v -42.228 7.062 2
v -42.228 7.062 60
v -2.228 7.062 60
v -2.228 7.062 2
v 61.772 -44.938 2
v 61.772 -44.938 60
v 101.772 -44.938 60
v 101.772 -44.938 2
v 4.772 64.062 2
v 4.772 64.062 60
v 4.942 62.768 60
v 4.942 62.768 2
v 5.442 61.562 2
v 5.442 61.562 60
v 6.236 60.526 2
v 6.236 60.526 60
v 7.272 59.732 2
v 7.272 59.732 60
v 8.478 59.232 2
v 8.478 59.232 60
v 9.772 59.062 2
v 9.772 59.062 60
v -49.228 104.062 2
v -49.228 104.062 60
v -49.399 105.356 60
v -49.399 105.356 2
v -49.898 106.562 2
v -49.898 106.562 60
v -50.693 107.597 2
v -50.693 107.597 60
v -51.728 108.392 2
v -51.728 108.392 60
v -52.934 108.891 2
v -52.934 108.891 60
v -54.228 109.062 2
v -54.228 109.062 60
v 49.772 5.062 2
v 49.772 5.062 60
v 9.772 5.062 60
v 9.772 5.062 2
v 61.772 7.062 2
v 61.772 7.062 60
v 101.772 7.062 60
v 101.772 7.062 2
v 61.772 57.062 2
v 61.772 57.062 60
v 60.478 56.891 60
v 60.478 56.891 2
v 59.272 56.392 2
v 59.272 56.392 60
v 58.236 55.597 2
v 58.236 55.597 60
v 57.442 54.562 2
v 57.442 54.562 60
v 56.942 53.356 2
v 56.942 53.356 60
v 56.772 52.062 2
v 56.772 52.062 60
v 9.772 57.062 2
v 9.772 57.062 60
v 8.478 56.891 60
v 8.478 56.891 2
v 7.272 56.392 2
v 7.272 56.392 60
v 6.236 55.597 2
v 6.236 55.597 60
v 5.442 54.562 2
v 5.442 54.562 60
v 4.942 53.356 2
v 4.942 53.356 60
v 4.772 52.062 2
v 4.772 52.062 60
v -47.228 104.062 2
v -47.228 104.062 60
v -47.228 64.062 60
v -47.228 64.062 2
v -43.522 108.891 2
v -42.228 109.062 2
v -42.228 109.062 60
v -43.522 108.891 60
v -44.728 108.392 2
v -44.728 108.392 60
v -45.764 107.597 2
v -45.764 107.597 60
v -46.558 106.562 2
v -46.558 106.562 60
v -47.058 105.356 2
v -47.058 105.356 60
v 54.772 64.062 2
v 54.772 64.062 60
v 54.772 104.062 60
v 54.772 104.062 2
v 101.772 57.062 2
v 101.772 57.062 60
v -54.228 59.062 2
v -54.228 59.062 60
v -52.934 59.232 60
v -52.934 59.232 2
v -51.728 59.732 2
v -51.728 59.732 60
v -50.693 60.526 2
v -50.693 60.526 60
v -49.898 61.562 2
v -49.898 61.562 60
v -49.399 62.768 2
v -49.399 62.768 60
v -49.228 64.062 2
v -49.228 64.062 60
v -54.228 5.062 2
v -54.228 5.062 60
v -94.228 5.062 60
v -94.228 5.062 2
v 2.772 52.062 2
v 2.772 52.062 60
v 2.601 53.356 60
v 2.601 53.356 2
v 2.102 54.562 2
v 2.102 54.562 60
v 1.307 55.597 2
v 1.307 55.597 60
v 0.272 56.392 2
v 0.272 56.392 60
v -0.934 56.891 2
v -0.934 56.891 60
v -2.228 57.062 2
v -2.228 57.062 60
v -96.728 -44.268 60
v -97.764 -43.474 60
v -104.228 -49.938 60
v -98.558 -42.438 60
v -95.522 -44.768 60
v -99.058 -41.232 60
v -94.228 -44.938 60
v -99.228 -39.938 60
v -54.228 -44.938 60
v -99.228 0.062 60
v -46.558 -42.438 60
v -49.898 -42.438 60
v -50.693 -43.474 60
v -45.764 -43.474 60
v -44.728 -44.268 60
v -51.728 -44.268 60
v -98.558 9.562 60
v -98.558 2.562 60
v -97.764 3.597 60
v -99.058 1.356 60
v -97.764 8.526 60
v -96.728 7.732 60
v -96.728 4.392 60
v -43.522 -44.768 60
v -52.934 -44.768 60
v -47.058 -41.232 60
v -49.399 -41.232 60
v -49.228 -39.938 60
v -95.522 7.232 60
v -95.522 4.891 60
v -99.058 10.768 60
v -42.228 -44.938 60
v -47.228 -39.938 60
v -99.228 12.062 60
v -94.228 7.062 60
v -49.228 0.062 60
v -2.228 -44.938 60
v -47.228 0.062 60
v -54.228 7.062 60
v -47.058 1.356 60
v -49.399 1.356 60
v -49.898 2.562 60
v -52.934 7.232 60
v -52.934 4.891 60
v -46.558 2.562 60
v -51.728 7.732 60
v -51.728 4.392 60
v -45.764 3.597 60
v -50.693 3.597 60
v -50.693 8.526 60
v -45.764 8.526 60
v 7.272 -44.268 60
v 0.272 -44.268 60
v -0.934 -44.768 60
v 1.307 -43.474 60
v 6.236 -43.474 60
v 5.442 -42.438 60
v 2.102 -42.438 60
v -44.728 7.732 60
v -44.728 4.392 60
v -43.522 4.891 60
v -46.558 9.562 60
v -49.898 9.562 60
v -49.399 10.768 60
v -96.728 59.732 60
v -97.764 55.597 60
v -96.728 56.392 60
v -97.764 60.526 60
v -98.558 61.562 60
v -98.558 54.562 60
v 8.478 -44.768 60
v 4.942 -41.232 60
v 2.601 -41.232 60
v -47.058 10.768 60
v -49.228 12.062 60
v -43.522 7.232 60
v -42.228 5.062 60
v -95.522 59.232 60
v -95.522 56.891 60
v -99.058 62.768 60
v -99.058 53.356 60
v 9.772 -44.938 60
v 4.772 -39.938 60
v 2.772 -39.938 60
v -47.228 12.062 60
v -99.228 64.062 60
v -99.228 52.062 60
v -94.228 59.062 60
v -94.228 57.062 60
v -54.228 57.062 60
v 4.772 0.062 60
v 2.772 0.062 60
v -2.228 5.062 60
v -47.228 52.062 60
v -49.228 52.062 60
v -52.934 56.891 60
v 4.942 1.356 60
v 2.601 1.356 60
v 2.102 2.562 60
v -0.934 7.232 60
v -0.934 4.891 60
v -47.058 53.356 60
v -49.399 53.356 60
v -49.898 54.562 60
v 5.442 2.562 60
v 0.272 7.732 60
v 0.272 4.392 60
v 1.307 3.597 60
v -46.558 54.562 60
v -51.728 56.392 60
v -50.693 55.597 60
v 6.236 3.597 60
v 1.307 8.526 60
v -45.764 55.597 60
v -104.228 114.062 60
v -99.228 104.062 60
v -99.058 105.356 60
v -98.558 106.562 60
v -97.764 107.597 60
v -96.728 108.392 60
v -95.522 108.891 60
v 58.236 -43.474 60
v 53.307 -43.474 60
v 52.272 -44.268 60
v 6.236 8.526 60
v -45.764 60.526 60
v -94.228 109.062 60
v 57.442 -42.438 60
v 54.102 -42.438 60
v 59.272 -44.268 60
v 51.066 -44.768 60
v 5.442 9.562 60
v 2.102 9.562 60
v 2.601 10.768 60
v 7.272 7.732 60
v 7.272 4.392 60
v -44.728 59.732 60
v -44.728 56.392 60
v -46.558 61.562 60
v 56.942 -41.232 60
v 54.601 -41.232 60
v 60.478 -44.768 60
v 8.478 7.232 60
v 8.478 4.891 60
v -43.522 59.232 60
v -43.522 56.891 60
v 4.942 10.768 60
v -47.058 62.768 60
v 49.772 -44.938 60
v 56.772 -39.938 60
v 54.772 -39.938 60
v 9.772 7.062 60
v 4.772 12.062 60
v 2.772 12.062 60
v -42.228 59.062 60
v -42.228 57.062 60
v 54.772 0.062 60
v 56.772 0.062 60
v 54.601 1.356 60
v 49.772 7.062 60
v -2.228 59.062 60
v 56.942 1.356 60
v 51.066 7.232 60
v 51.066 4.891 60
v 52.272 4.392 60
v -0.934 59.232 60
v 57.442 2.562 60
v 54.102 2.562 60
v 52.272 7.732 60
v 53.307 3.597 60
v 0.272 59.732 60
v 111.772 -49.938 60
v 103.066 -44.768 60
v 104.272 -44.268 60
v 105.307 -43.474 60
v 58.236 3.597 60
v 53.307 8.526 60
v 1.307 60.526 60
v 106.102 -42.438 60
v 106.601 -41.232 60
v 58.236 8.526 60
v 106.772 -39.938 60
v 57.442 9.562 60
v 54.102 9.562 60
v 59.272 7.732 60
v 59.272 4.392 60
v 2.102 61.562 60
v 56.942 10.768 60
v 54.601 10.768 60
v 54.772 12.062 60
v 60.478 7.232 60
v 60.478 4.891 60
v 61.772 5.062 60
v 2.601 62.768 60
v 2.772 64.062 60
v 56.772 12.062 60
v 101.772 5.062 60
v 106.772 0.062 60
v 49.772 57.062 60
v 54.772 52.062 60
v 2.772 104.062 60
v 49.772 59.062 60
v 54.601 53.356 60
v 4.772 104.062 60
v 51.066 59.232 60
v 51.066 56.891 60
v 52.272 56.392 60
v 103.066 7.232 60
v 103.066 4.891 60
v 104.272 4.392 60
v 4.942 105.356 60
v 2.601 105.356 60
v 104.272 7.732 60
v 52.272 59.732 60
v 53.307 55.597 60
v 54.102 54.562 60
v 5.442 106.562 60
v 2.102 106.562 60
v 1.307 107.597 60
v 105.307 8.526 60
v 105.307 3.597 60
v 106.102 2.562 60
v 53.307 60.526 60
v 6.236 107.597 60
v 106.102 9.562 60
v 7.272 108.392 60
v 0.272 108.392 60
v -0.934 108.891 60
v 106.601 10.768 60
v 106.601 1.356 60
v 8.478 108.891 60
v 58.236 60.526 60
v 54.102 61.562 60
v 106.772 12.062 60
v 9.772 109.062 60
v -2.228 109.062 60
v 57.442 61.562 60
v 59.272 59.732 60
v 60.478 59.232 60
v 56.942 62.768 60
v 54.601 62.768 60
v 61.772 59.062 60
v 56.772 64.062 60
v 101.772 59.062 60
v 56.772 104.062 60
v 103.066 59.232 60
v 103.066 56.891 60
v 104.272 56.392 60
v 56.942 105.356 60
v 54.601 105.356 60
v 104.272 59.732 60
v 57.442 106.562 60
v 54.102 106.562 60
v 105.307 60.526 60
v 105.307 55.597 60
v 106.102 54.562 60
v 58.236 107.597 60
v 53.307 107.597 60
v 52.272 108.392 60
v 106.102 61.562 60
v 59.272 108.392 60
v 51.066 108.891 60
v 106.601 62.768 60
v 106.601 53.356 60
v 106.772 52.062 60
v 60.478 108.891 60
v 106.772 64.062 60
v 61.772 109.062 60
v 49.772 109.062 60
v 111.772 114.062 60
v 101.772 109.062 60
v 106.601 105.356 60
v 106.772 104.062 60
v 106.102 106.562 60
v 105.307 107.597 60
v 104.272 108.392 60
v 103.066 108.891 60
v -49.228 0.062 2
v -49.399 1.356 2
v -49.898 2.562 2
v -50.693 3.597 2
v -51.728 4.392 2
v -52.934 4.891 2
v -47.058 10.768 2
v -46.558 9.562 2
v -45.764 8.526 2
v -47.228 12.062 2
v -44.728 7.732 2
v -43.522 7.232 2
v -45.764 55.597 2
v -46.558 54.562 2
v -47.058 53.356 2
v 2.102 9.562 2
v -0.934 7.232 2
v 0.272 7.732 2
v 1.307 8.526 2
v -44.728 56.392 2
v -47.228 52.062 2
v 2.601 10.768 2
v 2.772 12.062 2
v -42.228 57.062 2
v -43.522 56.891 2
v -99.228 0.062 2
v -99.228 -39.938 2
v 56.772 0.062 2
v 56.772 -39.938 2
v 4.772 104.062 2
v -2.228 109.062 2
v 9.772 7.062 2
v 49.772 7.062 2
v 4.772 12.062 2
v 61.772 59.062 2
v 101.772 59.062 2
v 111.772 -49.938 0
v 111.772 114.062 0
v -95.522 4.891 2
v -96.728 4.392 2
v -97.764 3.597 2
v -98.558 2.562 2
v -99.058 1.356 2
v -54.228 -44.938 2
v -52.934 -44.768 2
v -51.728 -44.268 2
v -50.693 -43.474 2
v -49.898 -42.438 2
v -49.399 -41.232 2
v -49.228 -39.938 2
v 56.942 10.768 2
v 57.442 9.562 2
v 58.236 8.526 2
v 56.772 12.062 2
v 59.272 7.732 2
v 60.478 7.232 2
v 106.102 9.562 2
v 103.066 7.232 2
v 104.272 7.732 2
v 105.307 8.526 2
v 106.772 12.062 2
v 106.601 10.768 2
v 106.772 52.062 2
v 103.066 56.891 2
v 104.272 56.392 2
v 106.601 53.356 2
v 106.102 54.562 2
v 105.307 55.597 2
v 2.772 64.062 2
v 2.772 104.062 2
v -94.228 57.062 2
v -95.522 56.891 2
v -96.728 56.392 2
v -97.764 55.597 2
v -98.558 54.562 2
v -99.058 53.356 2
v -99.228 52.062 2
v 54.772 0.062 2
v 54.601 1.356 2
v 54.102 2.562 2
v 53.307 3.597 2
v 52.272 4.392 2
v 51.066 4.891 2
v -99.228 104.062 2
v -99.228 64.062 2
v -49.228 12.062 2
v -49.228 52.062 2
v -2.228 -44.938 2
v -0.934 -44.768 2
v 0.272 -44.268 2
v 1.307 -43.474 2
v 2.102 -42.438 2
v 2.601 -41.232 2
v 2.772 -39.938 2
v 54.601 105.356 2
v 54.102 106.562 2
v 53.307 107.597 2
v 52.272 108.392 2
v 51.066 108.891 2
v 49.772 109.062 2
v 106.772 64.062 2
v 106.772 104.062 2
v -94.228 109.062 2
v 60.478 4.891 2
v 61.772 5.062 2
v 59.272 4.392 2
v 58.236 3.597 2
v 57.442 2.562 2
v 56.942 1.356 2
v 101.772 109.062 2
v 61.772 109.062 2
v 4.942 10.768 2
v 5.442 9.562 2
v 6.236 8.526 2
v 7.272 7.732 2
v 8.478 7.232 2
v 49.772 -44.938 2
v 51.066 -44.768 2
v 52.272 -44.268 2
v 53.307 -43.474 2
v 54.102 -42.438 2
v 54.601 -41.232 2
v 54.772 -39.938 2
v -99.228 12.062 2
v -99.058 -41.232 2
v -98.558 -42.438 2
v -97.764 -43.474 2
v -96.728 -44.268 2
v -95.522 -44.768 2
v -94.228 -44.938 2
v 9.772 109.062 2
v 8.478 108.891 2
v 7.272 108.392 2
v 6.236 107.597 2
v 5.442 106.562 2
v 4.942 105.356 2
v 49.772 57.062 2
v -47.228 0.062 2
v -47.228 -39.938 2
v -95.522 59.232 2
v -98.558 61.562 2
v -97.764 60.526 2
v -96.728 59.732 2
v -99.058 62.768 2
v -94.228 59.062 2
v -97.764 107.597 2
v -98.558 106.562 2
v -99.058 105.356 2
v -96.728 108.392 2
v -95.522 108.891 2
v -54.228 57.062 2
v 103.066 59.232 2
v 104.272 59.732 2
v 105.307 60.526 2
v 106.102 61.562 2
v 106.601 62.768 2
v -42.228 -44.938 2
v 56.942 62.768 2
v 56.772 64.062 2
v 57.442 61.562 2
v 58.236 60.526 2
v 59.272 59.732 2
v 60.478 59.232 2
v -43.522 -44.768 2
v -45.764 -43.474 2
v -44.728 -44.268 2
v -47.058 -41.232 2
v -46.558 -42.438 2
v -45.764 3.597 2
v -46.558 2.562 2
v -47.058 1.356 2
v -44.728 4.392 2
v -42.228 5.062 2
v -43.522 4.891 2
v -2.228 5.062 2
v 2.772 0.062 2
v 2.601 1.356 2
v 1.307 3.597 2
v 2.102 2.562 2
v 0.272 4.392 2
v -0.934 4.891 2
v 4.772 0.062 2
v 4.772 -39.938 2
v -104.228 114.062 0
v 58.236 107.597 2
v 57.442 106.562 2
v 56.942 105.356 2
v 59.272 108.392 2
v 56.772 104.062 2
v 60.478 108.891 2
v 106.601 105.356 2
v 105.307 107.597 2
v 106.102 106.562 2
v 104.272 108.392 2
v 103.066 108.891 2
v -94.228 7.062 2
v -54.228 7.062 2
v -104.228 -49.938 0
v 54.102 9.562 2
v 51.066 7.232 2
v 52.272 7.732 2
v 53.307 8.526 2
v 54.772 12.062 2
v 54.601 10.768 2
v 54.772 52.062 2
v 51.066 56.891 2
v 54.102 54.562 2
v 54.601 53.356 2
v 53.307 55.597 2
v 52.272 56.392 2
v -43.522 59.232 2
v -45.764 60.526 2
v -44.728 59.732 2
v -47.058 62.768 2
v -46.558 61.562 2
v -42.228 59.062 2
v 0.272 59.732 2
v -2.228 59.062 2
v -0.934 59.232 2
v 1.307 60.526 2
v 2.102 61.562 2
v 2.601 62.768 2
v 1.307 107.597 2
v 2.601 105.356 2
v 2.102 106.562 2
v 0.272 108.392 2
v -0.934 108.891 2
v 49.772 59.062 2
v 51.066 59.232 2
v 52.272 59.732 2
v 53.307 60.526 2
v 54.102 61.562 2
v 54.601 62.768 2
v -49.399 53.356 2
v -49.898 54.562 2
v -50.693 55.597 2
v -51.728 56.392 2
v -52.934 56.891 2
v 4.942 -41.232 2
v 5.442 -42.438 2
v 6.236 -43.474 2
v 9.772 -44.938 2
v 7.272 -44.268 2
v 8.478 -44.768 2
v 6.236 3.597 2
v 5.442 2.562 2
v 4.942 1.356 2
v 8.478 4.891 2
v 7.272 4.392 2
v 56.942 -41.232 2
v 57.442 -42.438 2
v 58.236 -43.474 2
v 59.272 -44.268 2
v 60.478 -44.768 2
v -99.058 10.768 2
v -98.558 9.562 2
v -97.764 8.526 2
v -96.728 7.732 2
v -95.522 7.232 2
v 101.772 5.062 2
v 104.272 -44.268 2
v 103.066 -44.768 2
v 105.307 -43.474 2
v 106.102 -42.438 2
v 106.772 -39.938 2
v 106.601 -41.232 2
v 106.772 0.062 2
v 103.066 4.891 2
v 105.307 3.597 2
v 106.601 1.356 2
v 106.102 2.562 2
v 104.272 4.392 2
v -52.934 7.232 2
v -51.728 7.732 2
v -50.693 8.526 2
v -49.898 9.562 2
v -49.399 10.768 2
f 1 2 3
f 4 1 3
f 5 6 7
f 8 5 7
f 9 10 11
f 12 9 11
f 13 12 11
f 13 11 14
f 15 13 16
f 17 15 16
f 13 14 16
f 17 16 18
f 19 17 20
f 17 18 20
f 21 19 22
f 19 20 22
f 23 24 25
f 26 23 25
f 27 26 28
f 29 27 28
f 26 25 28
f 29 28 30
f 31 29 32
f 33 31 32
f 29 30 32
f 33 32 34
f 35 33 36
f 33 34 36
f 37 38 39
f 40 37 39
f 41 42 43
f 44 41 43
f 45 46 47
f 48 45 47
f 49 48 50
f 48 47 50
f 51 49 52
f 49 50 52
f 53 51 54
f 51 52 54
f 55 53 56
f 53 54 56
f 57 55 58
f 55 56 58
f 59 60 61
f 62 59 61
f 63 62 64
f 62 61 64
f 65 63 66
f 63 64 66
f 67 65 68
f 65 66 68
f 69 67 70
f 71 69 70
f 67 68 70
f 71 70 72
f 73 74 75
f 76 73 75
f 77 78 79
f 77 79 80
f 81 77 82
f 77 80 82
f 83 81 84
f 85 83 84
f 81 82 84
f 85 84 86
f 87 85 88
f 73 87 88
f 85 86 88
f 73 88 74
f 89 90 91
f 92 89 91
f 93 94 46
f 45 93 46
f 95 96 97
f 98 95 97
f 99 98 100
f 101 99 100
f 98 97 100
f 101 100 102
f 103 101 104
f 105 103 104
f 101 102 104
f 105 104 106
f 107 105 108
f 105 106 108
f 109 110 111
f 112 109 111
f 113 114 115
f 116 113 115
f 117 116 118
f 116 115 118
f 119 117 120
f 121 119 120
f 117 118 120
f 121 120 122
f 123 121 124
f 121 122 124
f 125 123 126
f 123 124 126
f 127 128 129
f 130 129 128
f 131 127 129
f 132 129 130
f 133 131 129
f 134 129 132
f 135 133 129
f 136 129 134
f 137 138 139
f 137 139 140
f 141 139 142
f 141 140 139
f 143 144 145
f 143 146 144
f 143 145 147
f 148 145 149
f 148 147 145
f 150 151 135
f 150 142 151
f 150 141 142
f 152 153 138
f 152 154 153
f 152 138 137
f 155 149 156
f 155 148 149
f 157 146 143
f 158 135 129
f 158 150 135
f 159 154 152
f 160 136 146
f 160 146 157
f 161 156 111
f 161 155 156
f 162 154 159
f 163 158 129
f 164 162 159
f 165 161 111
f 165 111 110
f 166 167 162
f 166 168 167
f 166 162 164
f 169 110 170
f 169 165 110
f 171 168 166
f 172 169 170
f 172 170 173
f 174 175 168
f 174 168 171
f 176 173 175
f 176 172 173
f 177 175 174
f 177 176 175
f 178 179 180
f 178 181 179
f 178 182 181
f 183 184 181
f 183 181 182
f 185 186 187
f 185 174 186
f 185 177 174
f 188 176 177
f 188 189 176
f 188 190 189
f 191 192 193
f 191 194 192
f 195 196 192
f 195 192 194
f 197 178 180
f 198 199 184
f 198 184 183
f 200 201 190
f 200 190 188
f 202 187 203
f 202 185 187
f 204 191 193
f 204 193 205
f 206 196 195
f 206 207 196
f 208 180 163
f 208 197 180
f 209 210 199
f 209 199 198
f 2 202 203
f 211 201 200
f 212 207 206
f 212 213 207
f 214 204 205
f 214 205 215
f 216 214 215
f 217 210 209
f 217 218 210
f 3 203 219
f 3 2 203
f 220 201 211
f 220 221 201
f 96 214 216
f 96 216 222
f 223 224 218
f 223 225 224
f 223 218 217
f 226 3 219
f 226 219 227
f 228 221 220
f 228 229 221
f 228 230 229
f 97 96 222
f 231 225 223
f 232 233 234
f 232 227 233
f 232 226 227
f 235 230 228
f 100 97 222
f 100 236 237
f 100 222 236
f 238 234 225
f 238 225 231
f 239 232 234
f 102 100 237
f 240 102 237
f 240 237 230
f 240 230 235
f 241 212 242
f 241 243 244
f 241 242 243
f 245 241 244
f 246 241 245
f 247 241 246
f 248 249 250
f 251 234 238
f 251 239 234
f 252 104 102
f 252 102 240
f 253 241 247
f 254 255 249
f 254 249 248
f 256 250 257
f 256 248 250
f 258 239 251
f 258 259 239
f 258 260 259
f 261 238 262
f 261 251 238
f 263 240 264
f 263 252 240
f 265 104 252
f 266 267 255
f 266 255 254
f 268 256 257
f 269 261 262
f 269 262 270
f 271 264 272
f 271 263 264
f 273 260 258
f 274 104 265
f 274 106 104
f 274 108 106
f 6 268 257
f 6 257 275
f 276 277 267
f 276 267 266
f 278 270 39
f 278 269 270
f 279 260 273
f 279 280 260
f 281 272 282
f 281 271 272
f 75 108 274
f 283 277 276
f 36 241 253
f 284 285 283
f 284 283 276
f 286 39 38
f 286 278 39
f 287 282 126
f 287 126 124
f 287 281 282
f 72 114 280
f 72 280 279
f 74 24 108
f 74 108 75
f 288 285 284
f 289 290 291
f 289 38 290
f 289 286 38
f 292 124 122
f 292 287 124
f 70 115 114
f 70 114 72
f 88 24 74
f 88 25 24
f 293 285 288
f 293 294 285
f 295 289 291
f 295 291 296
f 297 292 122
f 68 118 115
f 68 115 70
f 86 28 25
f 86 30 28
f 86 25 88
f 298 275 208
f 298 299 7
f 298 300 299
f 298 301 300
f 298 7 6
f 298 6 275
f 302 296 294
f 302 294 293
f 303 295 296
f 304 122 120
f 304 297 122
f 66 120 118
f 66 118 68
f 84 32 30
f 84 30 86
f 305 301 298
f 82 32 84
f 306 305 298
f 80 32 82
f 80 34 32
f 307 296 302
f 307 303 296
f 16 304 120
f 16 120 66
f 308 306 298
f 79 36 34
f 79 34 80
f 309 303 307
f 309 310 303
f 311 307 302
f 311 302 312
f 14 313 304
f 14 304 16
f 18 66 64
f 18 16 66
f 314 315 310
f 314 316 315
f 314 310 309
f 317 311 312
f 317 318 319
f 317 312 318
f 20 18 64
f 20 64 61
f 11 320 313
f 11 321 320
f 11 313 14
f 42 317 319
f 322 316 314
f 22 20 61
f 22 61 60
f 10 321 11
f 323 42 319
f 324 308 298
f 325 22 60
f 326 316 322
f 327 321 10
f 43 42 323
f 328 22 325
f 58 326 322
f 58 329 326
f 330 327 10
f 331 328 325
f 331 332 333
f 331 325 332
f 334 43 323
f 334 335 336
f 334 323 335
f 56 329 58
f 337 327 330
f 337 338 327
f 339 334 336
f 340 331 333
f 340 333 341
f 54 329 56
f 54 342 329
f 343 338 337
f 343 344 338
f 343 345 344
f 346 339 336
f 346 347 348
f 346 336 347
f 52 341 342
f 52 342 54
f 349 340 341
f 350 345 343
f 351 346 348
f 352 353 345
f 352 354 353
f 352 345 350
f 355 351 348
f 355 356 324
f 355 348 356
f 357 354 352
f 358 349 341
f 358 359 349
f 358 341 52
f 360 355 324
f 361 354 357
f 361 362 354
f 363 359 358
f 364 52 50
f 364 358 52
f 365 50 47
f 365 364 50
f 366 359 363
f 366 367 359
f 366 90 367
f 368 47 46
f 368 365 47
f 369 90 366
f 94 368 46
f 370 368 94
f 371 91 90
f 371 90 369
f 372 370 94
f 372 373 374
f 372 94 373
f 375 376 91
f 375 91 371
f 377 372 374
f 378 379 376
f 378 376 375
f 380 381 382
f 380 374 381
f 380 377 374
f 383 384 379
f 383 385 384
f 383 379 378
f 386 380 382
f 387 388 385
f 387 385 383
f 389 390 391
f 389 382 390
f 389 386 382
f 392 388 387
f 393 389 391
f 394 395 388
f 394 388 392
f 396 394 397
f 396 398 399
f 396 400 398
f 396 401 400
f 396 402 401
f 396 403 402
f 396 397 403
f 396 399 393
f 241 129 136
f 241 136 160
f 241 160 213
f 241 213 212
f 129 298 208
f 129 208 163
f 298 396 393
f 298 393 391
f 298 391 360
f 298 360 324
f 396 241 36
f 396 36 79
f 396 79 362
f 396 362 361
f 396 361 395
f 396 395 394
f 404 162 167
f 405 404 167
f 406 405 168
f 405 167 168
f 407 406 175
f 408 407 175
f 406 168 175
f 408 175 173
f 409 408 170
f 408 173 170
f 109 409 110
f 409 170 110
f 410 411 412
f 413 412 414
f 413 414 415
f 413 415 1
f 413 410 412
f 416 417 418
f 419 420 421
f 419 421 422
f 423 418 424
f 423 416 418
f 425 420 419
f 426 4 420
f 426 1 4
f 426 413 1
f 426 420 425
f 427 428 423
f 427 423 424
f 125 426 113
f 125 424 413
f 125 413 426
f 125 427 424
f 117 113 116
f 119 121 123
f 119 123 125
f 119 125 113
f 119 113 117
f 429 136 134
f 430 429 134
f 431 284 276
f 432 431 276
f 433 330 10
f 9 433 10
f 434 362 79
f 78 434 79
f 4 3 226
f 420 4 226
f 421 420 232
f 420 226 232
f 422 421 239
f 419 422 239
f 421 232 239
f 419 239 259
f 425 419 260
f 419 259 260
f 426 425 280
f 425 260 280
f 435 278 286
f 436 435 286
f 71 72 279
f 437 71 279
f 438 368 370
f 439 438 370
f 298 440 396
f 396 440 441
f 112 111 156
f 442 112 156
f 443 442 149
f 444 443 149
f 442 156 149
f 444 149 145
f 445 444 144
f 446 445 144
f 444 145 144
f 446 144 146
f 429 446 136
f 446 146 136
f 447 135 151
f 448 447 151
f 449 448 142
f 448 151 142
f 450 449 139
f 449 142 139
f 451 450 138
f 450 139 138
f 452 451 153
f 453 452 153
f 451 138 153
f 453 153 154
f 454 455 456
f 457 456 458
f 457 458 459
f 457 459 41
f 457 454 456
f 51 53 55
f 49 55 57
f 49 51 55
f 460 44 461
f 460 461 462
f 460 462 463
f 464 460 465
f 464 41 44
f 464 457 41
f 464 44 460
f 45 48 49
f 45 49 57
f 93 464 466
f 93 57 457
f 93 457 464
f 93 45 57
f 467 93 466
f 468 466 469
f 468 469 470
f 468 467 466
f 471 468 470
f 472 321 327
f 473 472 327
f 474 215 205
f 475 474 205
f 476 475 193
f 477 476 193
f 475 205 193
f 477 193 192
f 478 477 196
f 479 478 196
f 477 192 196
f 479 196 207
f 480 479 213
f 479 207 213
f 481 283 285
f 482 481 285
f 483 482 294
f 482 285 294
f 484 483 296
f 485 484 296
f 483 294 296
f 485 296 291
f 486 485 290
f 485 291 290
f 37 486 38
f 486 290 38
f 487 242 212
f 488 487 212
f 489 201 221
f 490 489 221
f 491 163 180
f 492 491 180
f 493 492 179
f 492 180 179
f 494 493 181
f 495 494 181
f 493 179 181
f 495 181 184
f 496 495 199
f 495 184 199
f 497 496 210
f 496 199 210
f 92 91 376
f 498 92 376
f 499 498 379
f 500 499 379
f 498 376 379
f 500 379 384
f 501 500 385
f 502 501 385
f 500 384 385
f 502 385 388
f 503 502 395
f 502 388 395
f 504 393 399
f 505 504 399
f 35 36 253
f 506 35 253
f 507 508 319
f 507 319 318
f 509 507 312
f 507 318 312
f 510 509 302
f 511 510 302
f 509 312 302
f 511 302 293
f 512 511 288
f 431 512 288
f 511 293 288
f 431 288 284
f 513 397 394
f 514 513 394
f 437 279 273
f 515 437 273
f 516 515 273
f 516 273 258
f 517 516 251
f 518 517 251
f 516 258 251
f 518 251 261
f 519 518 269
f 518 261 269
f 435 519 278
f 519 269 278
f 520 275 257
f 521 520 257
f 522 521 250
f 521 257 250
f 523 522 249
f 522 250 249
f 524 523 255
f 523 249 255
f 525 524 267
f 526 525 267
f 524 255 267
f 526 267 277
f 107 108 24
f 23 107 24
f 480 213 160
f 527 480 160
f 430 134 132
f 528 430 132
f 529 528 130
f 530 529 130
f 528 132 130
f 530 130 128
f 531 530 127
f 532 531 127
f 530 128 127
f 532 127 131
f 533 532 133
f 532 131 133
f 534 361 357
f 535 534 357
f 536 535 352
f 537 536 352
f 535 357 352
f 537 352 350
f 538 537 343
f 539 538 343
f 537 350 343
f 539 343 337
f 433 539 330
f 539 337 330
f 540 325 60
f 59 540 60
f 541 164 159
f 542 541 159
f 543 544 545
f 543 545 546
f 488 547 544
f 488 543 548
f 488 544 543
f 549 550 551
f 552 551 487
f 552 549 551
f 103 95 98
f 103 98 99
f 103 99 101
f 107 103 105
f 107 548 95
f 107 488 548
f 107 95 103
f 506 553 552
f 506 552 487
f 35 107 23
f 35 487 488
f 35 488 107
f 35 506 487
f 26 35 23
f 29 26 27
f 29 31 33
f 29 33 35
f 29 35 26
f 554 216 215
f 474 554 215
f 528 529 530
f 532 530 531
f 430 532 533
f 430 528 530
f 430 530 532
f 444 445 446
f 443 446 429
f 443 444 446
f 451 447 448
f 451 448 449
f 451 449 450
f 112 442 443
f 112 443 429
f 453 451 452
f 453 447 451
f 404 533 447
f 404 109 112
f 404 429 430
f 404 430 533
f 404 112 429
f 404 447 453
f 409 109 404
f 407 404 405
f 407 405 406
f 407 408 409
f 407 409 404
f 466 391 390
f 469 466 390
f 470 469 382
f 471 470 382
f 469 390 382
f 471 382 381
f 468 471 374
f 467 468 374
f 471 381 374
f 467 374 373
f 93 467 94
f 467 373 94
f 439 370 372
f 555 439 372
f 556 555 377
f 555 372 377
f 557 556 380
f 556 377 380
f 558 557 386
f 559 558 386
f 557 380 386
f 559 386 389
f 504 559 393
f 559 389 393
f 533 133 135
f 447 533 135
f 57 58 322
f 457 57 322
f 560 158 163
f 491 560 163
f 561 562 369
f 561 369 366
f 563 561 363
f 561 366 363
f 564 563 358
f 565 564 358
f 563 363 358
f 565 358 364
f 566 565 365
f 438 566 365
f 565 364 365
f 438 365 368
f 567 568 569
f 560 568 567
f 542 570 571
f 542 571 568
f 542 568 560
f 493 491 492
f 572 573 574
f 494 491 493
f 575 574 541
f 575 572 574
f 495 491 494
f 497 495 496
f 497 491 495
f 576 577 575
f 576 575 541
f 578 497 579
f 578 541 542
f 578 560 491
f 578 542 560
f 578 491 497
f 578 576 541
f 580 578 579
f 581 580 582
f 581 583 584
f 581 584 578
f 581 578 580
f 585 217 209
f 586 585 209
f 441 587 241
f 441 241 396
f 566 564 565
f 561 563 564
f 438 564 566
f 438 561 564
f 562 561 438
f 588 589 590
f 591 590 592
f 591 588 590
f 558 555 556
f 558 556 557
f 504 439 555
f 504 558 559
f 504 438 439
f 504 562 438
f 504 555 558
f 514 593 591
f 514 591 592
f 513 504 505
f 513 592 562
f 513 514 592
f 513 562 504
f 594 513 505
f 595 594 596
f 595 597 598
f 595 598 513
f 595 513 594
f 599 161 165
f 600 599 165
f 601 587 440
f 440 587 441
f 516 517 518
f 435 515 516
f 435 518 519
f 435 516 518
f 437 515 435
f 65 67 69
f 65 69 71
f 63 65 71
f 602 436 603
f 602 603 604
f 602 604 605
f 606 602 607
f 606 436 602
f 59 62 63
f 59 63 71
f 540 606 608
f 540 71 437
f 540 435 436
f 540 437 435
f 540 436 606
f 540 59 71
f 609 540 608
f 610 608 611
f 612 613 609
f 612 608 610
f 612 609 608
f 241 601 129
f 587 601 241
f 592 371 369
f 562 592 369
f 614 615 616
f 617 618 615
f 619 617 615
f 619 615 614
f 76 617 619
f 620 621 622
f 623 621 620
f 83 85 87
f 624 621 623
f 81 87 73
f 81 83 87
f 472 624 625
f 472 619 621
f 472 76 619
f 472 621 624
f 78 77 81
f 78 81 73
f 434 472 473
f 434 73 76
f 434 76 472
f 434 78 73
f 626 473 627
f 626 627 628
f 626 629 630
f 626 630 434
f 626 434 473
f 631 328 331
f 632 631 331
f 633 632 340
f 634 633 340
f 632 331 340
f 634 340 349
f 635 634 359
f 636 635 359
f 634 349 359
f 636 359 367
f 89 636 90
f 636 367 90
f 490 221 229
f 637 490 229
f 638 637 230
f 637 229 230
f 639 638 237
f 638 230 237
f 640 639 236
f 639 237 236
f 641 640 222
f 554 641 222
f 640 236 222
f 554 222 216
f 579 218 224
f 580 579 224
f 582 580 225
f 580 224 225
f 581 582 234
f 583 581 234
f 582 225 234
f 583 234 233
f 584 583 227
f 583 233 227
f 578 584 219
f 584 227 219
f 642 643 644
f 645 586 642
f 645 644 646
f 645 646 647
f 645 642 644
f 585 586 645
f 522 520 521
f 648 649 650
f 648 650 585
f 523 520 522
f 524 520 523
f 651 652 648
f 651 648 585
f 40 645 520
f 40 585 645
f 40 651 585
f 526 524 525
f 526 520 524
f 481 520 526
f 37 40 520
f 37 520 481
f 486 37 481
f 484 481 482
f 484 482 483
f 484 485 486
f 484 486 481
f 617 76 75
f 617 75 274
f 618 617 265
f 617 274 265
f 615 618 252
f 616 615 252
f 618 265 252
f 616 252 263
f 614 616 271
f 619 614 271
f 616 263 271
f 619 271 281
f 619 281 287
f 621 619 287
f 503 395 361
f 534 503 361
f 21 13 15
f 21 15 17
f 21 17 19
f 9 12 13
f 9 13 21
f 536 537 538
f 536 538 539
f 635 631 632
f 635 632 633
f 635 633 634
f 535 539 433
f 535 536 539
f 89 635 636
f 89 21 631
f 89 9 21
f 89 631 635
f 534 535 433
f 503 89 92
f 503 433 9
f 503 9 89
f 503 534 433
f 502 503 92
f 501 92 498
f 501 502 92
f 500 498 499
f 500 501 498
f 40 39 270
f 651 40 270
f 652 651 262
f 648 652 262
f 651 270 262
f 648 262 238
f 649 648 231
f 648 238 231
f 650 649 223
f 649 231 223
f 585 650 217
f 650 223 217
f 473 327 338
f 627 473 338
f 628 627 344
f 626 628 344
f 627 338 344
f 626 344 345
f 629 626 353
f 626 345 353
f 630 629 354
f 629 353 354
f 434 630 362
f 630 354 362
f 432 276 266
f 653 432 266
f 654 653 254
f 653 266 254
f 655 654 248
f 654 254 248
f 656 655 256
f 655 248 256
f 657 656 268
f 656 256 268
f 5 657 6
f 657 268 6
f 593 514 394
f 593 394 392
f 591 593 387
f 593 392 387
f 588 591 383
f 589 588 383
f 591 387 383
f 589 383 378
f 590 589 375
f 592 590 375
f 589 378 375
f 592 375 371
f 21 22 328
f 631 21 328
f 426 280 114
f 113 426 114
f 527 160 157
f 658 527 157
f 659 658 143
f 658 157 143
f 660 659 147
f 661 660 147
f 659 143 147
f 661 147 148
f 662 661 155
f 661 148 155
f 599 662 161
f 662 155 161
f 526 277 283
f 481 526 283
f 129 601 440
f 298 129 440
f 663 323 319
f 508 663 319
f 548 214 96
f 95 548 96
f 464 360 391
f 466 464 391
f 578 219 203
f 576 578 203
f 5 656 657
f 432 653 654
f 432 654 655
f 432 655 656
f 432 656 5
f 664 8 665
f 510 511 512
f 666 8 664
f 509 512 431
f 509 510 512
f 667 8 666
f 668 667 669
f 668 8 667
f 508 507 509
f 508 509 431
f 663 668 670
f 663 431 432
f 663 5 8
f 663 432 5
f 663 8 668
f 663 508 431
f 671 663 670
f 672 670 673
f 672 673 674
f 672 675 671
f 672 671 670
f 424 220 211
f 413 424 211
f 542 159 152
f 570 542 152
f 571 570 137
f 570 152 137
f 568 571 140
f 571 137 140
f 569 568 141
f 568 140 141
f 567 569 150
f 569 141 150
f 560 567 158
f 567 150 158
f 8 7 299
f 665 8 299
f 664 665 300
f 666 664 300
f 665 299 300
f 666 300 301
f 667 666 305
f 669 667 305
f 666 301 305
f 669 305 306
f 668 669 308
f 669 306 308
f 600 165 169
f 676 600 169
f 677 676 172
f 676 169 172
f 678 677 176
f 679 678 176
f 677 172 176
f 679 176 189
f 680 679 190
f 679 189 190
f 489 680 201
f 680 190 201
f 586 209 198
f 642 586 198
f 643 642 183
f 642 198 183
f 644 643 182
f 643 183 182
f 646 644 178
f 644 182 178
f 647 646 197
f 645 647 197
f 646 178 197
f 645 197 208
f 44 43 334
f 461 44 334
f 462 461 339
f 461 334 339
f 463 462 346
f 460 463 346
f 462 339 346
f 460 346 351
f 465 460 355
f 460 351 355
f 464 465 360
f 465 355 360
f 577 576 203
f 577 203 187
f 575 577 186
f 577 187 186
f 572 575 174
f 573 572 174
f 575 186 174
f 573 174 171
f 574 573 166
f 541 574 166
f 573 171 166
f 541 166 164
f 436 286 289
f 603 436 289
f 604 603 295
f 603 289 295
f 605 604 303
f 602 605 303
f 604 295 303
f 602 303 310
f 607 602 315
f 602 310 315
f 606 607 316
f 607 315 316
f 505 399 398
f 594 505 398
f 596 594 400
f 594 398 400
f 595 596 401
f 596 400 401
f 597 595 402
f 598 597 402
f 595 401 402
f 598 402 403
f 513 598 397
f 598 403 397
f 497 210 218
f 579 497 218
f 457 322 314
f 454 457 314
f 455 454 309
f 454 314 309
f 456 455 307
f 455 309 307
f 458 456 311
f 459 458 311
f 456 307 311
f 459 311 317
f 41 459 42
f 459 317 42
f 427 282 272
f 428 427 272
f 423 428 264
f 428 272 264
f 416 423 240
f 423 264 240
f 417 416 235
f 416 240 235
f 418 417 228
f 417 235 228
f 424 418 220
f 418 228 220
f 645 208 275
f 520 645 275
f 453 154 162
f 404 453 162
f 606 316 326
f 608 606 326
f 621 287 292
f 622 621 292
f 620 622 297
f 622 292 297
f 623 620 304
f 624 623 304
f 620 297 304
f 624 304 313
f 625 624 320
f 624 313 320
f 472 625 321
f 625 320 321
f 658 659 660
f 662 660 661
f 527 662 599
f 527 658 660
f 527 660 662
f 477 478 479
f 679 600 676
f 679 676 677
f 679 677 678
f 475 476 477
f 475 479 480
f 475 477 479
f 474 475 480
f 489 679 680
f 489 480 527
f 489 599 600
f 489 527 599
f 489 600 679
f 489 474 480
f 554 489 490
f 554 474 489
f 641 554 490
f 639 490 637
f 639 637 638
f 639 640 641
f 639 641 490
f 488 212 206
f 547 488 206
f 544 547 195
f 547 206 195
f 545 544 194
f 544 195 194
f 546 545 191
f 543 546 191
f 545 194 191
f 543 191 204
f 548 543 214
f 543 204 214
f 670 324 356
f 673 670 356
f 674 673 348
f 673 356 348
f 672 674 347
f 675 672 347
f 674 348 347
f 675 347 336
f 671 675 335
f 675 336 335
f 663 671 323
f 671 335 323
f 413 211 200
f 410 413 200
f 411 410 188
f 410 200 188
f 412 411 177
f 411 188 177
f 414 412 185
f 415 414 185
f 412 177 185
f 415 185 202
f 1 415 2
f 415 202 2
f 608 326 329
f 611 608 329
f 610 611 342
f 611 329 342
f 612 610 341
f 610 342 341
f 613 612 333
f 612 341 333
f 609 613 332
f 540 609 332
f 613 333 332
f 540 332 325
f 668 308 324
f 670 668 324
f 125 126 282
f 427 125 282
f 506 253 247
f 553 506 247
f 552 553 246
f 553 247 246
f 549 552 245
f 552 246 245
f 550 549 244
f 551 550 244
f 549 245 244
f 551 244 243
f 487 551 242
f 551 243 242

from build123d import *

# Parameters (mm, degrees)
F0_W     = 216
F0_H     = 164
F1_DEPTH = 60
F3_DEPTH = 58


with BuildPart() as f1:
    # F0 (on Top) → F1 (new body)
    with BuildSketch(Plane.XY):
        with Locations((3.771866, 32.061749)):
            Rectangle(F0_W, F0_H)
    extrude(amount=F1_DEPTH)

    # F2 (on face) → F3 (cut)
    with BuildSketch(Plane.XY.offset(60)):
        with BuildLine():
            ThreePointArc((-99.228134, -39.938251), (-97.763668, -43.473785), (-94.228134, -44.938251))
            Line((-94.228134, -44.938251), (-54.228134, -44.938251))
            ThreePointArc((-54.228134, -44.938251), (-50.6926, -43.473785), (-49.228134, -39.938251))
            Line((-49.228134, -39.938251), (-49.228134, 0.061749))
            ThreePointArc((-49.228134, 0.061749), (-50.6926, 3.597283), (-54.228134, 5.061749))
            Line((-54.228134, 5.061749), (-94.228134, 5.061749))
            ThreePointArc((-94.228134, 5.061749), (-97.763668, 3.597283), (-99.228134, 0.061749))
            Line((-99.228134, 0.061749), (-99.228134, -39.938251))
        make_face()
        with BuildLine():
            ThreePointArc((-54.228134, 7.061749), (-50.6926, 8.526215), (-49.228134, 12.061749))
            Line((-49.228134, 12.061749), (-49.228134, 52.061749))
            ThreePointArc((-49.228134, 52.061749), (-50.6926, 55.597283), (-54.228134, 57.061749))
            Line((-54.228134, 57.061749), (-94.228134, 57.061749))
            ThreePointArc((-94.228134, 57.061749), (-97.763668, 55.597283), (-99.228134, 52.061749))
            Line((-99.228134, 52.061749), (-99.228134, 12.061749))
            ThreePointArc((-99.228134, 12.061749), (-97.763668, 8.526215), (-94.228134, 7.061749))
            Line((-94.228134, 7.061749), (-54.228134, 7.061749))
        make_face()
        with BuildLine():
            ThreePointArc((-54.228134, 59.061749), (-50.6926, 60.526215), (-49.228134, 64.061749))
            Line((-49.228134, 64.061749), (-49.228134, 104.061749))
            ThreePointArc((-49.228134, 104.061749), (-50.6926, 107.597283), (-54.228134, 109.061749))
            Line((-54.228134, 109.061749), (-94.228134, 109.061749))
            ThreePointArc((-94.228134, 109.061749), (-97.763668, 107.597283), (-99.228134, 104.061749))
            Line((-99.228134, 104.061749), (-99.228134, 64.061749))
            ThreePointArc((-99.228134, 64.061749), (-97.763668, 60.526215), (-94.228134, 59.061749))
            Line((-94.228134, 59.061749), (-54.228134, 59.061749))
        make_face()
        with BuildLine():
            ThreePointArc((-2.228134, -44.938251), (1.3074, -43.473785), (2.771866, -39.938251))
            Line((2.771866, -39.938251), (2.771866, 0.061749))
            ThreePointArc((2.771866, 0.061749), (1.3074, 3.597283), (-2.228134, 5.061749))
            Line((-2.228134, 5.061749), (-42.228134, 5.061749))
            ThreePointArc((-42.228134, 5.061749), (-45.763668, 3.597283), (-47.228134, 0.061749))
            Line((-47.228134, 0.061749), (-47.228134, -39.938251))
            ThreePointArc((-47.228134, -39.938251), (-45.763668, -43.473785), (-42.228134, -44.938251))
            Line((-42.228134, -44.938251), (-2.228134, -44.938251))
        make_face()
        with BuildLine():
            ThreePointArc((-2.228134, 7.061749), (1.3074, 8.526215), (2.771866, 12.061749))
            Line((2.771866, 12.061749), (2.771866, 52.061749))
            ThreePointArc((2.771866, 52.061749), (1.3074, 55.597283), (-2.228134, 57.061749))
            Line((-2.228134, 57.061749), (-42.228134, 57.061749))
            ThreePointArc((-42.228134, 57.061749), (-45.763668, 55.597283), (-47.228134, 52.061749))
            Line((-47.228134, 52.061749), (-47.228134, 12.061749))
            ThreePointArc((-47.228134, 12.061749), (-45.763668, 8.526215), (-42.228134, 7.061749))
            Line((-42.228134, 7.061749), (-2.228134, 7.061749))
        make_face()
        with BuildLine():
            ThreePointArc((-2.228134, 59.061749), (1.3074, 60.526215), (2.771866, 64.061749))
            Line((2.771866, 64.061749), (2.771866, 104.061749))
            ThreePointArc((2.771866, 104.061749), (1.3074, 107.597283), (-2.228134, 109.061749))
            Line((-2.228134, 109.061749), (-42.228134, 109.061749))
            ThreePointArc((-42.228134, 109.061749), (-45.763668, 107.597283), (-47.228134, 104.061749))
            Line((-47.228134, 104.061749), (-47.228134, 64.061749))
            ThreePointArc((-47.228134, 64.061749), (-45.763668, 60.526215), (-42.228134, 59.061749))
            Line((-42.228134, 59.061749), (-2.228134, 59.061749))
        make_face()
        with BuildLine():
            ThreePointArc((49.771866, -44.938251), (53.3074, -43.473785), (54.771866, -39.938251))
            Line((54.771866, -39.938251), (54.771866, 0.061749))
            ThreePointArc((54.771866, 0.061749), (53.3074, 3.597283), (49.771866, 5.061749))
            Line((49.771866, 5.061749), (9.771866, 5.061749))
            ThreePointArc((9.771866, 5.061749), (6.236332, 3.597283), (4.771866, 0.061749))
            Line((4.771866, 0.061749), (4.771866, -39.938251))
            ThreePointArc((4.771866, -39.938251), (6.236332, -43.473785), (9.771866, -44.938251))
            Line((9.771866, -44.938251), (49.771866, -44.938251))
        make_face()
        with BuildLine():
            ThreePointArc((49.771866, 7.061749), (53.3074, 8.526215), (54.771866, 12.061749))
            Line((54.771866, 12.061749), (54.771866, 52.061749))
            ThreePointArc((54.771866, 52.061749), (53.3074, 55.597283), (49.771866, 57.061749))
            Line((49.771866, 57.061749), (9.771866, 57.061749))
            ThreePointArc((9.771866, 57.061749), (6.236332, 55.597283), (4.771866, 52.061749))
            Line((4.771866, 52.061749), (4.771866, 12.061749))
            ThreePointArc((4.771866, 12.061749), (6.236332, 8.526215), (9.771866, 7.061749))
            Line((9.771866, 7.061749), (49.771866, 7.061749))
        make_face()
        with BuildLine():
            ThreePointArc((49.771866, 59.061749), (53.3074, 60.526215), (54.771866, 64.061749))
            Line((54.771866, 64.061749), (54.771866, 104.061749))
            ThreePointArc((54.771866, 104.061749), (53.3074, 107.597283), (49.771866, 109.061749))
            Line((49.771866, 109.061749), (9.771866, 109.061749))
            ThreePointArc((9.771866, 109.061749), (6.236332, 107.597283), (4.771866, 104.061749))
            Line((4.771866, 104.061749), (4.771866, 64.061749))
            ThreePointArc((4.771866, 64.061749), (6.236332, 60.526215), (9.771866, 59.061749))
            Line((9.771866, 59.061749), (49.771866, 59.061749))
        make_face()
        with BuildLine():
            ThreePointArc((101.771866, -44.938251), (105.3074, -43.473785), (106.771866, -39.938251))
            Line((106.771866, -39.938251), (106.771866, 0.061749))
            ThreePointArc((106.771866, 0.061749), (105.3074, 3.597283), (101.771866, 5.061749))
            Line((101.771866, 5.061749), (61.771866, 5.061749))
            ThreePointArc((61.771866, 5.061749), (58.236332, 3.597283), (56.771866, 0.061749))
            Line((56.771866, 0.061749), (56.771866, -39.938251))
            ThreePointArc((56.771866, -39.938251), (58.236332, -43.473785), (61.771866, -44.938251))
            Line((61.771866, -44.938251), (101.771866, -44.938251))
        make_face()
        with BuildLine():
            ThreePointArc((101.771866, 7.061749), (105.3074, 8.526215), (106.771866, 12.061749))
            Line((106.771866, 12.061749), (106.771866, 52.061749))
            ThreePointArc((106.771866, 52.061749), (105.3074, 55.597283), (101.771866, 57.061749))
            Line((101.771866, 57.061749), (61.771866, 57.061749))
            ThreePointArc((61.771866, 57.061749), (58.236332, 55.597283), (56.771866, 52.061749))
            Line((56.771866, 52.061749), (56.771866, 12.061749))
            ThreePointArc((56.771866, 12.061749), (58.236332, 8.526215), (61.771866, 7.061749))
            Line((61.771866, 7.061749), (101.771866, 7.061749))
        make_face()
        with BuildLine():
            ThreePointArc((101.771866, 59.061749), (105.3074, 60.526215), (106.771866, 64.061749))
            Line((106.771866, 64.061749), (106.771866, 104.061749))
            ThreePointArc((106.771866, 104.061749), (105.3074, 107.597283), (101.771866, 109.061749))
            Line((101.771866, 109.061749), (61.771866, 109.061749))
            ThreePointArc((61.771866, 109.061749), (58.236332, 107.597283), (56.771866, 104.061749))
            Line((56.771866, 104.061749), (56.771866, 64.061749))
            ThreePointArc((56.771866, 64.061749), (58.236332, 60.526215), (61.771866, 59.061749))
            Line((61.771866, 59.061749), (101.771866, 59.061749))
        make_face()
    extrude(amount=-F3_DEPTH, mode=Mode.SUBTRACT)


solid = f1.part
